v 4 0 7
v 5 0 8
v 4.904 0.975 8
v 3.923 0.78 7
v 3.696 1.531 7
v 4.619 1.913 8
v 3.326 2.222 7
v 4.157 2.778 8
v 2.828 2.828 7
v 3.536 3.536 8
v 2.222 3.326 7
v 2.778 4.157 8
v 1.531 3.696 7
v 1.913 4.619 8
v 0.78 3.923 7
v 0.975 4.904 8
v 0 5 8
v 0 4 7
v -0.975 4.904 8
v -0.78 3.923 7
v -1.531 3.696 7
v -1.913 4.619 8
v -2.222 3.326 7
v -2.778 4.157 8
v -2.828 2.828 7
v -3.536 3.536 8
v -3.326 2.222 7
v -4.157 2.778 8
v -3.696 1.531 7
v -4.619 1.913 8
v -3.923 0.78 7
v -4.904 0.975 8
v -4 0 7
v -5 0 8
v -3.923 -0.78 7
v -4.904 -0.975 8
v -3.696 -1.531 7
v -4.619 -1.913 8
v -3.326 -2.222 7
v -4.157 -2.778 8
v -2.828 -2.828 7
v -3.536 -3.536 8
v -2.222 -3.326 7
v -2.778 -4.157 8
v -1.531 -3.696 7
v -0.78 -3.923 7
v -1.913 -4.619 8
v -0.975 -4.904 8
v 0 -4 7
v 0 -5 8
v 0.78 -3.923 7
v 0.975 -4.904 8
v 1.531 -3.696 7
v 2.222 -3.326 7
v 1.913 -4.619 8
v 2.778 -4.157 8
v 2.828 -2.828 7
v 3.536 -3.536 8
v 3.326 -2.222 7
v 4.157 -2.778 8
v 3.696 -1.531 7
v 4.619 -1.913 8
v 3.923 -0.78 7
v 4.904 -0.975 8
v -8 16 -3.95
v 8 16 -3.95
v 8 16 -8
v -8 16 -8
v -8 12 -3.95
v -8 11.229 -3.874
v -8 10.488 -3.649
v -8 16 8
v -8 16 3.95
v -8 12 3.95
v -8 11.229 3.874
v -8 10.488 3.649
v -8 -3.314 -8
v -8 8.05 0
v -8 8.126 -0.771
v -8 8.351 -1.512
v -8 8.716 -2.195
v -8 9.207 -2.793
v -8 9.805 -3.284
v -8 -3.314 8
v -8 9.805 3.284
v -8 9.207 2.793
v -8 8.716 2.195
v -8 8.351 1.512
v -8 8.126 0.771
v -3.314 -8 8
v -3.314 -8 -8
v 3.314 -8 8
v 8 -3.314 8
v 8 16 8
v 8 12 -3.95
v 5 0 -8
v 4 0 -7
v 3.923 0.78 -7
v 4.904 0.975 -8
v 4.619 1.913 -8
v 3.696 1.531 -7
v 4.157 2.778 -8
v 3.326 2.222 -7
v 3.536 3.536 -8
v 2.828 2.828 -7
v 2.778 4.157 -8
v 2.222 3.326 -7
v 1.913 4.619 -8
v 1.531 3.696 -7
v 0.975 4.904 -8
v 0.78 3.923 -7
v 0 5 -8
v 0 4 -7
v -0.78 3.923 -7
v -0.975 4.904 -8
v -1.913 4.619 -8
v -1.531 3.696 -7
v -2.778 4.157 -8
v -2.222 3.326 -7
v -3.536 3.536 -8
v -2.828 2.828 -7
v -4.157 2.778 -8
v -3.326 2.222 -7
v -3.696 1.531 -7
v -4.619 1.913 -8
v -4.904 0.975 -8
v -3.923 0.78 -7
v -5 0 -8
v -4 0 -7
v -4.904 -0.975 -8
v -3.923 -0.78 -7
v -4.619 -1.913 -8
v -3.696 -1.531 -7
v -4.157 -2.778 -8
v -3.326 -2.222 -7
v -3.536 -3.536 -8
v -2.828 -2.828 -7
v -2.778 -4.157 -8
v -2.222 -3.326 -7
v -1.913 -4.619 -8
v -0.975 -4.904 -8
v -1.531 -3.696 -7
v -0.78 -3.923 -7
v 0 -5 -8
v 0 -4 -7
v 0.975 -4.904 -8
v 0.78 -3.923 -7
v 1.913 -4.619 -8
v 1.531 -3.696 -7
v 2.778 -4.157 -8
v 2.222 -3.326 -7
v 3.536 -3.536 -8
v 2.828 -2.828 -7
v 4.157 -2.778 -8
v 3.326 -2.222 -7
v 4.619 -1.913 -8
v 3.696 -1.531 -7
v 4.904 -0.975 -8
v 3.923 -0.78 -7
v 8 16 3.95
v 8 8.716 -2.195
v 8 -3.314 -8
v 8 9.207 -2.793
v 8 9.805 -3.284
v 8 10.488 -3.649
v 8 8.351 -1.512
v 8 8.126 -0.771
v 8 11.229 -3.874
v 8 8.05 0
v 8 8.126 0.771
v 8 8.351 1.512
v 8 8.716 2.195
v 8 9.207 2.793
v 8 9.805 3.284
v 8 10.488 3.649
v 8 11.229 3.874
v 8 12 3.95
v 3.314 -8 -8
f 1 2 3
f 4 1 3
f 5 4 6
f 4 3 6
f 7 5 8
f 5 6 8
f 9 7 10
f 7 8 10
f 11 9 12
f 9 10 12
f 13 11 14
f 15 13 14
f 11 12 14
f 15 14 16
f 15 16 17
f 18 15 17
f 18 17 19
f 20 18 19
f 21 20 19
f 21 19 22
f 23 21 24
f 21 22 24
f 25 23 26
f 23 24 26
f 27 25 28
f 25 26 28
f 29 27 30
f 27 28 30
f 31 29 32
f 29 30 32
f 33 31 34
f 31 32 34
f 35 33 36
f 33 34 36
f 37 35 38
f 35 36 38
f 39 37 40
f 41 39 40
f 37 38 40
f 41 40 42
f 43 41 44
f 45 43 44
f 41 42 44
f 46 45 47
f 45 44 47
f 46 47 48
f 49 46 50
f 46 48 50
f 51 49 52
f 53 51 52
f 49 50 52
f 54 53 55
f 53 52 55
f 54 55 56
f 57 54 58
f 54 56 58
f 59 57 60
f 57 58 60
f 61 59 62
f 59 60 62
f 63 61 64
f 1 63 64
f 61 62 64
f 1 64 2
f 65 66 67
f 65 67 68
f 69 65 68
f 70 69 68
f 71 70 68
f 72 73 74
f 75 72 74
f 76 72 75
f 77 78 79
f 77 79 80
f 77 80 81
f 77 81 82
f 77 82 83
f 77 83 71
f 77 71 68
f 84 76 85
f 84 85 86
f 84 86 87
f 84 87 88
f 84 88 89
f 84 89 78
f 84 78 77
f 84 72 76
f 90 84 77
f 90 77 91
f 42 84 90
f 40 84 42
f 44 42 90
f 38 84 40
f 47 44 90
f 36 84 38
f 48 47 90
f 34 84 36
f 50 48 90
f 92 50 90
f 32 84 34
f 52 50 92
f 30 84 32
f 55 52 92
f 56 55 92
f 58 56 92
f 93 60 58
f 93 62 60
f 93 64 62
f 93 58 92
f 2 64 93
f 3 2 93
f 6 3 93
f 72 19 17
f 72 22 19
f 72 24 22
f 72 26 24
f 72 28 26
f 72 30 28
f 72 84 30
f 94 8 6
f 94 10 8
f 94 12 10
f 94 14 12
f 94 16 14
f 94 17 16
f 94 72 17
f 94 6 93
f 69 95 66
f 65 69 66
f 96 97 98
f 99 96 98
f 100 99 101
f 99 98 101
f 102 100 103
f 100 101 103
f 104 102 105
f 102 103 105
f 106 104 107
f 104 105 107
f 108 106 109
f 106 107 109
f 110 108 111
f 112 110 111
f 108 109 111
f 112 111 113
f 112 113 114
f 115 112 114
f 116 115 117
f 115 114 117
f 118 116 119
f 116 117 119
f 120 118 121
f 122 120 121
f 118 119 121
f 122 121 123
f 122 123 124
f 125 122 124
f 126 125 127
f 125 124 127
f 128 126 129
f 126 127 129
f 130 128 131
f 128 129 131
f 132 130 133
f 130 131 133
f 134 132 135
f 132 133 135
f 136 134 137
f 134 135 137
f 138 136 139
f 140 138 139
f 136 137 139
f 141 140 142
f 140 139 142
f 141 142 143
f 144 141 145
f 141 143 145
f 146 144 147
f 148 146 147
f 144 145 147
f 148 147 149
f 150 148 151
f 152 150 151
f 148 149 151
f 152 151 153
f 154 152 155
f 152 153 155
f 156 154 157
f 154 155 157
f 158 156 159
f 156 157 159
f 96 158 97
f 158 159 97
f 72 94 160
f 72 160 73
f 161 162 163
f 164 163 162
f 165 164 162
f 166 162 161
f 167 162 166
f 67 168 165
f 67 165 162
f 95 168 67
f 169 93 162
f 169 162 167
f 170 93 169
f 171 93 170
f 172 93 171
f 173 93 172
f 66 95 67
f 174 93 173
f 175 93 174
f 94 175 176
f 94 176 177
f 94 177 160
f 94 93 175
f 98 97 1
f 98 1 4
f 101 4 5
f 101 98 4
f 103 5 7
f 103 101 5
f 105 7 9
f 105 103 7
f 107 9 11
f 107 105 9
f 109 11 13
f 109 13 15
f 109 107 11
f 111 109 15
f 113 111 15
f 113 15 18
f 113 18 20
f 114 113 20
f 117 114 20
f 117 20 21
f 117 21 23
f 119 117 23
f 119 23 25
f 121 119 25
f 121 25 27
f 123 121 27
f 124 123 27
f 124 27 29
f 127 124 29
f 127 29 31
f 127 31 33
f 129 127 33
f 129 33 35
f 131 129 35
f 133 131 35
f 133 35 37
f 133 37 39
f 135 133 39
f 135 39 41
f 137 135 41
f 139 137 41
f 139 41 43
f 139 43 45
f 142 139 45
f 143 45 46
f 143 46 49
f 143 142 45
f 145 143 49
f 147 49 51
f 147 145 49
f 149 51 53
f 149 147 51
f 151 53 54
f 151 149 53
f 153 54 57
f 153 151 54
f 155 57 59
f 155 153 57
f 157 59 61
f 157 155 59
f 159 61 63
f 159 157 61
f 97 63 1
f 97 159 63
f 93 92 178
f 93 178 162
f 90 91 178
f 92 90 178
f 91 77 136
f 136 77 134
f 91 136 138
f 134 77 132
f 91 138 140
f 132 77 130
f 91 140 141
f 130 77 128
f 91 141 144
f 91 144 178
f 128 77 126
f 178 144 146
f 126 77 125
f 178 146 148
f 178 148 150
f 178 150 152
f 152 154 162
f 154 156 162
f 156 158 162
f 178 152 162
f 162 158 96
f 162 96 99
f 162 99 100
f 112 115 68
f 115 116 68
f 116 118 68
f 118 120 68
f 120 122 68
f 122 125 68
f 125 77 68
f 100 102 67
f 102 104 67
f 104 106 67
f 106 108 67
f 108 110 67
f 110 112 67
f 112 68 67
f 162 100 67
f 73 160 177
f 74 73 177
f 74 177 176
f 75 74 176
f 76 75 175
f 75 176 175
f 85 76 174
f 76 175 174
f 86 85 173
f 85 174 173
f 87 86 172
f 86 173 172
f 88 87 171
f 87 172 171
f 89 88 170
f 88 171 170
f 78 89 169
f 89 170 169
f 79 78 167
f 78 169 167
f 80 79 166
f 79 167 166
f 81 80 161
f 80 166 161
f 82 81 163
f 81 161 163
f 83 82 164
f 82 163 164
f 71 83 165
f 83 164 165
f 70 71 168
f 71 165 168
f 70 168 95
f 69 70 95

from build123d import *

# Parameters (mm, degrees)
F0_R          = 4
F1_DEPTH      = 8
F3_DEPTH      = 8.001
F3_DEPTH_BACK = 8.001
F4_SIZE       = 1


with BuildPart() as f1:
    # F0 (on Top) → F1 (new body, symmetric)
    with BuildSketch(Plane.XY):
        Polygon((-8, 16), (-8, 0), (-8, -3.313708499), (-3.313708499, -8), (3.313708499, -8), (8, -3.313708499), (8, 0), (8, 16), align=None)
        Circle(F0_R, mode=Mode.SUBTRACT)
    extrude(amount=F1_DEPTH, both=True)

    # F2 (on Right) → F3 (cut, two sides)
    with BuildSketch(Plane.YZ) as f3_sk:
        with BuildLine():
            Line((16, 3.95), (12, 3.95))
            ThreePointArc((12, 3.95), (8.05, 0), (12, -3.95))
            Line((12, -3.95), (16, -3.95))
            Line((16, -3.95), (16, 3.95))
        make_face()
    extrude(amount=-F3_DEPTH, mode=Mode.SUBTRACT)
    extrude(f3_sk.sketch, amount=F3_DEPTH_BACK, mode=Mode.SUBTRACT)

    # F4
    f4_edges = [f1.edges().sort_by_distance(p)[0] for p in [
        (-4, 0, 8),
        (-4, 0, -8),
    ]]
    chamfer(f4_edges, length=F4_SIZE)


solid = f1.part
